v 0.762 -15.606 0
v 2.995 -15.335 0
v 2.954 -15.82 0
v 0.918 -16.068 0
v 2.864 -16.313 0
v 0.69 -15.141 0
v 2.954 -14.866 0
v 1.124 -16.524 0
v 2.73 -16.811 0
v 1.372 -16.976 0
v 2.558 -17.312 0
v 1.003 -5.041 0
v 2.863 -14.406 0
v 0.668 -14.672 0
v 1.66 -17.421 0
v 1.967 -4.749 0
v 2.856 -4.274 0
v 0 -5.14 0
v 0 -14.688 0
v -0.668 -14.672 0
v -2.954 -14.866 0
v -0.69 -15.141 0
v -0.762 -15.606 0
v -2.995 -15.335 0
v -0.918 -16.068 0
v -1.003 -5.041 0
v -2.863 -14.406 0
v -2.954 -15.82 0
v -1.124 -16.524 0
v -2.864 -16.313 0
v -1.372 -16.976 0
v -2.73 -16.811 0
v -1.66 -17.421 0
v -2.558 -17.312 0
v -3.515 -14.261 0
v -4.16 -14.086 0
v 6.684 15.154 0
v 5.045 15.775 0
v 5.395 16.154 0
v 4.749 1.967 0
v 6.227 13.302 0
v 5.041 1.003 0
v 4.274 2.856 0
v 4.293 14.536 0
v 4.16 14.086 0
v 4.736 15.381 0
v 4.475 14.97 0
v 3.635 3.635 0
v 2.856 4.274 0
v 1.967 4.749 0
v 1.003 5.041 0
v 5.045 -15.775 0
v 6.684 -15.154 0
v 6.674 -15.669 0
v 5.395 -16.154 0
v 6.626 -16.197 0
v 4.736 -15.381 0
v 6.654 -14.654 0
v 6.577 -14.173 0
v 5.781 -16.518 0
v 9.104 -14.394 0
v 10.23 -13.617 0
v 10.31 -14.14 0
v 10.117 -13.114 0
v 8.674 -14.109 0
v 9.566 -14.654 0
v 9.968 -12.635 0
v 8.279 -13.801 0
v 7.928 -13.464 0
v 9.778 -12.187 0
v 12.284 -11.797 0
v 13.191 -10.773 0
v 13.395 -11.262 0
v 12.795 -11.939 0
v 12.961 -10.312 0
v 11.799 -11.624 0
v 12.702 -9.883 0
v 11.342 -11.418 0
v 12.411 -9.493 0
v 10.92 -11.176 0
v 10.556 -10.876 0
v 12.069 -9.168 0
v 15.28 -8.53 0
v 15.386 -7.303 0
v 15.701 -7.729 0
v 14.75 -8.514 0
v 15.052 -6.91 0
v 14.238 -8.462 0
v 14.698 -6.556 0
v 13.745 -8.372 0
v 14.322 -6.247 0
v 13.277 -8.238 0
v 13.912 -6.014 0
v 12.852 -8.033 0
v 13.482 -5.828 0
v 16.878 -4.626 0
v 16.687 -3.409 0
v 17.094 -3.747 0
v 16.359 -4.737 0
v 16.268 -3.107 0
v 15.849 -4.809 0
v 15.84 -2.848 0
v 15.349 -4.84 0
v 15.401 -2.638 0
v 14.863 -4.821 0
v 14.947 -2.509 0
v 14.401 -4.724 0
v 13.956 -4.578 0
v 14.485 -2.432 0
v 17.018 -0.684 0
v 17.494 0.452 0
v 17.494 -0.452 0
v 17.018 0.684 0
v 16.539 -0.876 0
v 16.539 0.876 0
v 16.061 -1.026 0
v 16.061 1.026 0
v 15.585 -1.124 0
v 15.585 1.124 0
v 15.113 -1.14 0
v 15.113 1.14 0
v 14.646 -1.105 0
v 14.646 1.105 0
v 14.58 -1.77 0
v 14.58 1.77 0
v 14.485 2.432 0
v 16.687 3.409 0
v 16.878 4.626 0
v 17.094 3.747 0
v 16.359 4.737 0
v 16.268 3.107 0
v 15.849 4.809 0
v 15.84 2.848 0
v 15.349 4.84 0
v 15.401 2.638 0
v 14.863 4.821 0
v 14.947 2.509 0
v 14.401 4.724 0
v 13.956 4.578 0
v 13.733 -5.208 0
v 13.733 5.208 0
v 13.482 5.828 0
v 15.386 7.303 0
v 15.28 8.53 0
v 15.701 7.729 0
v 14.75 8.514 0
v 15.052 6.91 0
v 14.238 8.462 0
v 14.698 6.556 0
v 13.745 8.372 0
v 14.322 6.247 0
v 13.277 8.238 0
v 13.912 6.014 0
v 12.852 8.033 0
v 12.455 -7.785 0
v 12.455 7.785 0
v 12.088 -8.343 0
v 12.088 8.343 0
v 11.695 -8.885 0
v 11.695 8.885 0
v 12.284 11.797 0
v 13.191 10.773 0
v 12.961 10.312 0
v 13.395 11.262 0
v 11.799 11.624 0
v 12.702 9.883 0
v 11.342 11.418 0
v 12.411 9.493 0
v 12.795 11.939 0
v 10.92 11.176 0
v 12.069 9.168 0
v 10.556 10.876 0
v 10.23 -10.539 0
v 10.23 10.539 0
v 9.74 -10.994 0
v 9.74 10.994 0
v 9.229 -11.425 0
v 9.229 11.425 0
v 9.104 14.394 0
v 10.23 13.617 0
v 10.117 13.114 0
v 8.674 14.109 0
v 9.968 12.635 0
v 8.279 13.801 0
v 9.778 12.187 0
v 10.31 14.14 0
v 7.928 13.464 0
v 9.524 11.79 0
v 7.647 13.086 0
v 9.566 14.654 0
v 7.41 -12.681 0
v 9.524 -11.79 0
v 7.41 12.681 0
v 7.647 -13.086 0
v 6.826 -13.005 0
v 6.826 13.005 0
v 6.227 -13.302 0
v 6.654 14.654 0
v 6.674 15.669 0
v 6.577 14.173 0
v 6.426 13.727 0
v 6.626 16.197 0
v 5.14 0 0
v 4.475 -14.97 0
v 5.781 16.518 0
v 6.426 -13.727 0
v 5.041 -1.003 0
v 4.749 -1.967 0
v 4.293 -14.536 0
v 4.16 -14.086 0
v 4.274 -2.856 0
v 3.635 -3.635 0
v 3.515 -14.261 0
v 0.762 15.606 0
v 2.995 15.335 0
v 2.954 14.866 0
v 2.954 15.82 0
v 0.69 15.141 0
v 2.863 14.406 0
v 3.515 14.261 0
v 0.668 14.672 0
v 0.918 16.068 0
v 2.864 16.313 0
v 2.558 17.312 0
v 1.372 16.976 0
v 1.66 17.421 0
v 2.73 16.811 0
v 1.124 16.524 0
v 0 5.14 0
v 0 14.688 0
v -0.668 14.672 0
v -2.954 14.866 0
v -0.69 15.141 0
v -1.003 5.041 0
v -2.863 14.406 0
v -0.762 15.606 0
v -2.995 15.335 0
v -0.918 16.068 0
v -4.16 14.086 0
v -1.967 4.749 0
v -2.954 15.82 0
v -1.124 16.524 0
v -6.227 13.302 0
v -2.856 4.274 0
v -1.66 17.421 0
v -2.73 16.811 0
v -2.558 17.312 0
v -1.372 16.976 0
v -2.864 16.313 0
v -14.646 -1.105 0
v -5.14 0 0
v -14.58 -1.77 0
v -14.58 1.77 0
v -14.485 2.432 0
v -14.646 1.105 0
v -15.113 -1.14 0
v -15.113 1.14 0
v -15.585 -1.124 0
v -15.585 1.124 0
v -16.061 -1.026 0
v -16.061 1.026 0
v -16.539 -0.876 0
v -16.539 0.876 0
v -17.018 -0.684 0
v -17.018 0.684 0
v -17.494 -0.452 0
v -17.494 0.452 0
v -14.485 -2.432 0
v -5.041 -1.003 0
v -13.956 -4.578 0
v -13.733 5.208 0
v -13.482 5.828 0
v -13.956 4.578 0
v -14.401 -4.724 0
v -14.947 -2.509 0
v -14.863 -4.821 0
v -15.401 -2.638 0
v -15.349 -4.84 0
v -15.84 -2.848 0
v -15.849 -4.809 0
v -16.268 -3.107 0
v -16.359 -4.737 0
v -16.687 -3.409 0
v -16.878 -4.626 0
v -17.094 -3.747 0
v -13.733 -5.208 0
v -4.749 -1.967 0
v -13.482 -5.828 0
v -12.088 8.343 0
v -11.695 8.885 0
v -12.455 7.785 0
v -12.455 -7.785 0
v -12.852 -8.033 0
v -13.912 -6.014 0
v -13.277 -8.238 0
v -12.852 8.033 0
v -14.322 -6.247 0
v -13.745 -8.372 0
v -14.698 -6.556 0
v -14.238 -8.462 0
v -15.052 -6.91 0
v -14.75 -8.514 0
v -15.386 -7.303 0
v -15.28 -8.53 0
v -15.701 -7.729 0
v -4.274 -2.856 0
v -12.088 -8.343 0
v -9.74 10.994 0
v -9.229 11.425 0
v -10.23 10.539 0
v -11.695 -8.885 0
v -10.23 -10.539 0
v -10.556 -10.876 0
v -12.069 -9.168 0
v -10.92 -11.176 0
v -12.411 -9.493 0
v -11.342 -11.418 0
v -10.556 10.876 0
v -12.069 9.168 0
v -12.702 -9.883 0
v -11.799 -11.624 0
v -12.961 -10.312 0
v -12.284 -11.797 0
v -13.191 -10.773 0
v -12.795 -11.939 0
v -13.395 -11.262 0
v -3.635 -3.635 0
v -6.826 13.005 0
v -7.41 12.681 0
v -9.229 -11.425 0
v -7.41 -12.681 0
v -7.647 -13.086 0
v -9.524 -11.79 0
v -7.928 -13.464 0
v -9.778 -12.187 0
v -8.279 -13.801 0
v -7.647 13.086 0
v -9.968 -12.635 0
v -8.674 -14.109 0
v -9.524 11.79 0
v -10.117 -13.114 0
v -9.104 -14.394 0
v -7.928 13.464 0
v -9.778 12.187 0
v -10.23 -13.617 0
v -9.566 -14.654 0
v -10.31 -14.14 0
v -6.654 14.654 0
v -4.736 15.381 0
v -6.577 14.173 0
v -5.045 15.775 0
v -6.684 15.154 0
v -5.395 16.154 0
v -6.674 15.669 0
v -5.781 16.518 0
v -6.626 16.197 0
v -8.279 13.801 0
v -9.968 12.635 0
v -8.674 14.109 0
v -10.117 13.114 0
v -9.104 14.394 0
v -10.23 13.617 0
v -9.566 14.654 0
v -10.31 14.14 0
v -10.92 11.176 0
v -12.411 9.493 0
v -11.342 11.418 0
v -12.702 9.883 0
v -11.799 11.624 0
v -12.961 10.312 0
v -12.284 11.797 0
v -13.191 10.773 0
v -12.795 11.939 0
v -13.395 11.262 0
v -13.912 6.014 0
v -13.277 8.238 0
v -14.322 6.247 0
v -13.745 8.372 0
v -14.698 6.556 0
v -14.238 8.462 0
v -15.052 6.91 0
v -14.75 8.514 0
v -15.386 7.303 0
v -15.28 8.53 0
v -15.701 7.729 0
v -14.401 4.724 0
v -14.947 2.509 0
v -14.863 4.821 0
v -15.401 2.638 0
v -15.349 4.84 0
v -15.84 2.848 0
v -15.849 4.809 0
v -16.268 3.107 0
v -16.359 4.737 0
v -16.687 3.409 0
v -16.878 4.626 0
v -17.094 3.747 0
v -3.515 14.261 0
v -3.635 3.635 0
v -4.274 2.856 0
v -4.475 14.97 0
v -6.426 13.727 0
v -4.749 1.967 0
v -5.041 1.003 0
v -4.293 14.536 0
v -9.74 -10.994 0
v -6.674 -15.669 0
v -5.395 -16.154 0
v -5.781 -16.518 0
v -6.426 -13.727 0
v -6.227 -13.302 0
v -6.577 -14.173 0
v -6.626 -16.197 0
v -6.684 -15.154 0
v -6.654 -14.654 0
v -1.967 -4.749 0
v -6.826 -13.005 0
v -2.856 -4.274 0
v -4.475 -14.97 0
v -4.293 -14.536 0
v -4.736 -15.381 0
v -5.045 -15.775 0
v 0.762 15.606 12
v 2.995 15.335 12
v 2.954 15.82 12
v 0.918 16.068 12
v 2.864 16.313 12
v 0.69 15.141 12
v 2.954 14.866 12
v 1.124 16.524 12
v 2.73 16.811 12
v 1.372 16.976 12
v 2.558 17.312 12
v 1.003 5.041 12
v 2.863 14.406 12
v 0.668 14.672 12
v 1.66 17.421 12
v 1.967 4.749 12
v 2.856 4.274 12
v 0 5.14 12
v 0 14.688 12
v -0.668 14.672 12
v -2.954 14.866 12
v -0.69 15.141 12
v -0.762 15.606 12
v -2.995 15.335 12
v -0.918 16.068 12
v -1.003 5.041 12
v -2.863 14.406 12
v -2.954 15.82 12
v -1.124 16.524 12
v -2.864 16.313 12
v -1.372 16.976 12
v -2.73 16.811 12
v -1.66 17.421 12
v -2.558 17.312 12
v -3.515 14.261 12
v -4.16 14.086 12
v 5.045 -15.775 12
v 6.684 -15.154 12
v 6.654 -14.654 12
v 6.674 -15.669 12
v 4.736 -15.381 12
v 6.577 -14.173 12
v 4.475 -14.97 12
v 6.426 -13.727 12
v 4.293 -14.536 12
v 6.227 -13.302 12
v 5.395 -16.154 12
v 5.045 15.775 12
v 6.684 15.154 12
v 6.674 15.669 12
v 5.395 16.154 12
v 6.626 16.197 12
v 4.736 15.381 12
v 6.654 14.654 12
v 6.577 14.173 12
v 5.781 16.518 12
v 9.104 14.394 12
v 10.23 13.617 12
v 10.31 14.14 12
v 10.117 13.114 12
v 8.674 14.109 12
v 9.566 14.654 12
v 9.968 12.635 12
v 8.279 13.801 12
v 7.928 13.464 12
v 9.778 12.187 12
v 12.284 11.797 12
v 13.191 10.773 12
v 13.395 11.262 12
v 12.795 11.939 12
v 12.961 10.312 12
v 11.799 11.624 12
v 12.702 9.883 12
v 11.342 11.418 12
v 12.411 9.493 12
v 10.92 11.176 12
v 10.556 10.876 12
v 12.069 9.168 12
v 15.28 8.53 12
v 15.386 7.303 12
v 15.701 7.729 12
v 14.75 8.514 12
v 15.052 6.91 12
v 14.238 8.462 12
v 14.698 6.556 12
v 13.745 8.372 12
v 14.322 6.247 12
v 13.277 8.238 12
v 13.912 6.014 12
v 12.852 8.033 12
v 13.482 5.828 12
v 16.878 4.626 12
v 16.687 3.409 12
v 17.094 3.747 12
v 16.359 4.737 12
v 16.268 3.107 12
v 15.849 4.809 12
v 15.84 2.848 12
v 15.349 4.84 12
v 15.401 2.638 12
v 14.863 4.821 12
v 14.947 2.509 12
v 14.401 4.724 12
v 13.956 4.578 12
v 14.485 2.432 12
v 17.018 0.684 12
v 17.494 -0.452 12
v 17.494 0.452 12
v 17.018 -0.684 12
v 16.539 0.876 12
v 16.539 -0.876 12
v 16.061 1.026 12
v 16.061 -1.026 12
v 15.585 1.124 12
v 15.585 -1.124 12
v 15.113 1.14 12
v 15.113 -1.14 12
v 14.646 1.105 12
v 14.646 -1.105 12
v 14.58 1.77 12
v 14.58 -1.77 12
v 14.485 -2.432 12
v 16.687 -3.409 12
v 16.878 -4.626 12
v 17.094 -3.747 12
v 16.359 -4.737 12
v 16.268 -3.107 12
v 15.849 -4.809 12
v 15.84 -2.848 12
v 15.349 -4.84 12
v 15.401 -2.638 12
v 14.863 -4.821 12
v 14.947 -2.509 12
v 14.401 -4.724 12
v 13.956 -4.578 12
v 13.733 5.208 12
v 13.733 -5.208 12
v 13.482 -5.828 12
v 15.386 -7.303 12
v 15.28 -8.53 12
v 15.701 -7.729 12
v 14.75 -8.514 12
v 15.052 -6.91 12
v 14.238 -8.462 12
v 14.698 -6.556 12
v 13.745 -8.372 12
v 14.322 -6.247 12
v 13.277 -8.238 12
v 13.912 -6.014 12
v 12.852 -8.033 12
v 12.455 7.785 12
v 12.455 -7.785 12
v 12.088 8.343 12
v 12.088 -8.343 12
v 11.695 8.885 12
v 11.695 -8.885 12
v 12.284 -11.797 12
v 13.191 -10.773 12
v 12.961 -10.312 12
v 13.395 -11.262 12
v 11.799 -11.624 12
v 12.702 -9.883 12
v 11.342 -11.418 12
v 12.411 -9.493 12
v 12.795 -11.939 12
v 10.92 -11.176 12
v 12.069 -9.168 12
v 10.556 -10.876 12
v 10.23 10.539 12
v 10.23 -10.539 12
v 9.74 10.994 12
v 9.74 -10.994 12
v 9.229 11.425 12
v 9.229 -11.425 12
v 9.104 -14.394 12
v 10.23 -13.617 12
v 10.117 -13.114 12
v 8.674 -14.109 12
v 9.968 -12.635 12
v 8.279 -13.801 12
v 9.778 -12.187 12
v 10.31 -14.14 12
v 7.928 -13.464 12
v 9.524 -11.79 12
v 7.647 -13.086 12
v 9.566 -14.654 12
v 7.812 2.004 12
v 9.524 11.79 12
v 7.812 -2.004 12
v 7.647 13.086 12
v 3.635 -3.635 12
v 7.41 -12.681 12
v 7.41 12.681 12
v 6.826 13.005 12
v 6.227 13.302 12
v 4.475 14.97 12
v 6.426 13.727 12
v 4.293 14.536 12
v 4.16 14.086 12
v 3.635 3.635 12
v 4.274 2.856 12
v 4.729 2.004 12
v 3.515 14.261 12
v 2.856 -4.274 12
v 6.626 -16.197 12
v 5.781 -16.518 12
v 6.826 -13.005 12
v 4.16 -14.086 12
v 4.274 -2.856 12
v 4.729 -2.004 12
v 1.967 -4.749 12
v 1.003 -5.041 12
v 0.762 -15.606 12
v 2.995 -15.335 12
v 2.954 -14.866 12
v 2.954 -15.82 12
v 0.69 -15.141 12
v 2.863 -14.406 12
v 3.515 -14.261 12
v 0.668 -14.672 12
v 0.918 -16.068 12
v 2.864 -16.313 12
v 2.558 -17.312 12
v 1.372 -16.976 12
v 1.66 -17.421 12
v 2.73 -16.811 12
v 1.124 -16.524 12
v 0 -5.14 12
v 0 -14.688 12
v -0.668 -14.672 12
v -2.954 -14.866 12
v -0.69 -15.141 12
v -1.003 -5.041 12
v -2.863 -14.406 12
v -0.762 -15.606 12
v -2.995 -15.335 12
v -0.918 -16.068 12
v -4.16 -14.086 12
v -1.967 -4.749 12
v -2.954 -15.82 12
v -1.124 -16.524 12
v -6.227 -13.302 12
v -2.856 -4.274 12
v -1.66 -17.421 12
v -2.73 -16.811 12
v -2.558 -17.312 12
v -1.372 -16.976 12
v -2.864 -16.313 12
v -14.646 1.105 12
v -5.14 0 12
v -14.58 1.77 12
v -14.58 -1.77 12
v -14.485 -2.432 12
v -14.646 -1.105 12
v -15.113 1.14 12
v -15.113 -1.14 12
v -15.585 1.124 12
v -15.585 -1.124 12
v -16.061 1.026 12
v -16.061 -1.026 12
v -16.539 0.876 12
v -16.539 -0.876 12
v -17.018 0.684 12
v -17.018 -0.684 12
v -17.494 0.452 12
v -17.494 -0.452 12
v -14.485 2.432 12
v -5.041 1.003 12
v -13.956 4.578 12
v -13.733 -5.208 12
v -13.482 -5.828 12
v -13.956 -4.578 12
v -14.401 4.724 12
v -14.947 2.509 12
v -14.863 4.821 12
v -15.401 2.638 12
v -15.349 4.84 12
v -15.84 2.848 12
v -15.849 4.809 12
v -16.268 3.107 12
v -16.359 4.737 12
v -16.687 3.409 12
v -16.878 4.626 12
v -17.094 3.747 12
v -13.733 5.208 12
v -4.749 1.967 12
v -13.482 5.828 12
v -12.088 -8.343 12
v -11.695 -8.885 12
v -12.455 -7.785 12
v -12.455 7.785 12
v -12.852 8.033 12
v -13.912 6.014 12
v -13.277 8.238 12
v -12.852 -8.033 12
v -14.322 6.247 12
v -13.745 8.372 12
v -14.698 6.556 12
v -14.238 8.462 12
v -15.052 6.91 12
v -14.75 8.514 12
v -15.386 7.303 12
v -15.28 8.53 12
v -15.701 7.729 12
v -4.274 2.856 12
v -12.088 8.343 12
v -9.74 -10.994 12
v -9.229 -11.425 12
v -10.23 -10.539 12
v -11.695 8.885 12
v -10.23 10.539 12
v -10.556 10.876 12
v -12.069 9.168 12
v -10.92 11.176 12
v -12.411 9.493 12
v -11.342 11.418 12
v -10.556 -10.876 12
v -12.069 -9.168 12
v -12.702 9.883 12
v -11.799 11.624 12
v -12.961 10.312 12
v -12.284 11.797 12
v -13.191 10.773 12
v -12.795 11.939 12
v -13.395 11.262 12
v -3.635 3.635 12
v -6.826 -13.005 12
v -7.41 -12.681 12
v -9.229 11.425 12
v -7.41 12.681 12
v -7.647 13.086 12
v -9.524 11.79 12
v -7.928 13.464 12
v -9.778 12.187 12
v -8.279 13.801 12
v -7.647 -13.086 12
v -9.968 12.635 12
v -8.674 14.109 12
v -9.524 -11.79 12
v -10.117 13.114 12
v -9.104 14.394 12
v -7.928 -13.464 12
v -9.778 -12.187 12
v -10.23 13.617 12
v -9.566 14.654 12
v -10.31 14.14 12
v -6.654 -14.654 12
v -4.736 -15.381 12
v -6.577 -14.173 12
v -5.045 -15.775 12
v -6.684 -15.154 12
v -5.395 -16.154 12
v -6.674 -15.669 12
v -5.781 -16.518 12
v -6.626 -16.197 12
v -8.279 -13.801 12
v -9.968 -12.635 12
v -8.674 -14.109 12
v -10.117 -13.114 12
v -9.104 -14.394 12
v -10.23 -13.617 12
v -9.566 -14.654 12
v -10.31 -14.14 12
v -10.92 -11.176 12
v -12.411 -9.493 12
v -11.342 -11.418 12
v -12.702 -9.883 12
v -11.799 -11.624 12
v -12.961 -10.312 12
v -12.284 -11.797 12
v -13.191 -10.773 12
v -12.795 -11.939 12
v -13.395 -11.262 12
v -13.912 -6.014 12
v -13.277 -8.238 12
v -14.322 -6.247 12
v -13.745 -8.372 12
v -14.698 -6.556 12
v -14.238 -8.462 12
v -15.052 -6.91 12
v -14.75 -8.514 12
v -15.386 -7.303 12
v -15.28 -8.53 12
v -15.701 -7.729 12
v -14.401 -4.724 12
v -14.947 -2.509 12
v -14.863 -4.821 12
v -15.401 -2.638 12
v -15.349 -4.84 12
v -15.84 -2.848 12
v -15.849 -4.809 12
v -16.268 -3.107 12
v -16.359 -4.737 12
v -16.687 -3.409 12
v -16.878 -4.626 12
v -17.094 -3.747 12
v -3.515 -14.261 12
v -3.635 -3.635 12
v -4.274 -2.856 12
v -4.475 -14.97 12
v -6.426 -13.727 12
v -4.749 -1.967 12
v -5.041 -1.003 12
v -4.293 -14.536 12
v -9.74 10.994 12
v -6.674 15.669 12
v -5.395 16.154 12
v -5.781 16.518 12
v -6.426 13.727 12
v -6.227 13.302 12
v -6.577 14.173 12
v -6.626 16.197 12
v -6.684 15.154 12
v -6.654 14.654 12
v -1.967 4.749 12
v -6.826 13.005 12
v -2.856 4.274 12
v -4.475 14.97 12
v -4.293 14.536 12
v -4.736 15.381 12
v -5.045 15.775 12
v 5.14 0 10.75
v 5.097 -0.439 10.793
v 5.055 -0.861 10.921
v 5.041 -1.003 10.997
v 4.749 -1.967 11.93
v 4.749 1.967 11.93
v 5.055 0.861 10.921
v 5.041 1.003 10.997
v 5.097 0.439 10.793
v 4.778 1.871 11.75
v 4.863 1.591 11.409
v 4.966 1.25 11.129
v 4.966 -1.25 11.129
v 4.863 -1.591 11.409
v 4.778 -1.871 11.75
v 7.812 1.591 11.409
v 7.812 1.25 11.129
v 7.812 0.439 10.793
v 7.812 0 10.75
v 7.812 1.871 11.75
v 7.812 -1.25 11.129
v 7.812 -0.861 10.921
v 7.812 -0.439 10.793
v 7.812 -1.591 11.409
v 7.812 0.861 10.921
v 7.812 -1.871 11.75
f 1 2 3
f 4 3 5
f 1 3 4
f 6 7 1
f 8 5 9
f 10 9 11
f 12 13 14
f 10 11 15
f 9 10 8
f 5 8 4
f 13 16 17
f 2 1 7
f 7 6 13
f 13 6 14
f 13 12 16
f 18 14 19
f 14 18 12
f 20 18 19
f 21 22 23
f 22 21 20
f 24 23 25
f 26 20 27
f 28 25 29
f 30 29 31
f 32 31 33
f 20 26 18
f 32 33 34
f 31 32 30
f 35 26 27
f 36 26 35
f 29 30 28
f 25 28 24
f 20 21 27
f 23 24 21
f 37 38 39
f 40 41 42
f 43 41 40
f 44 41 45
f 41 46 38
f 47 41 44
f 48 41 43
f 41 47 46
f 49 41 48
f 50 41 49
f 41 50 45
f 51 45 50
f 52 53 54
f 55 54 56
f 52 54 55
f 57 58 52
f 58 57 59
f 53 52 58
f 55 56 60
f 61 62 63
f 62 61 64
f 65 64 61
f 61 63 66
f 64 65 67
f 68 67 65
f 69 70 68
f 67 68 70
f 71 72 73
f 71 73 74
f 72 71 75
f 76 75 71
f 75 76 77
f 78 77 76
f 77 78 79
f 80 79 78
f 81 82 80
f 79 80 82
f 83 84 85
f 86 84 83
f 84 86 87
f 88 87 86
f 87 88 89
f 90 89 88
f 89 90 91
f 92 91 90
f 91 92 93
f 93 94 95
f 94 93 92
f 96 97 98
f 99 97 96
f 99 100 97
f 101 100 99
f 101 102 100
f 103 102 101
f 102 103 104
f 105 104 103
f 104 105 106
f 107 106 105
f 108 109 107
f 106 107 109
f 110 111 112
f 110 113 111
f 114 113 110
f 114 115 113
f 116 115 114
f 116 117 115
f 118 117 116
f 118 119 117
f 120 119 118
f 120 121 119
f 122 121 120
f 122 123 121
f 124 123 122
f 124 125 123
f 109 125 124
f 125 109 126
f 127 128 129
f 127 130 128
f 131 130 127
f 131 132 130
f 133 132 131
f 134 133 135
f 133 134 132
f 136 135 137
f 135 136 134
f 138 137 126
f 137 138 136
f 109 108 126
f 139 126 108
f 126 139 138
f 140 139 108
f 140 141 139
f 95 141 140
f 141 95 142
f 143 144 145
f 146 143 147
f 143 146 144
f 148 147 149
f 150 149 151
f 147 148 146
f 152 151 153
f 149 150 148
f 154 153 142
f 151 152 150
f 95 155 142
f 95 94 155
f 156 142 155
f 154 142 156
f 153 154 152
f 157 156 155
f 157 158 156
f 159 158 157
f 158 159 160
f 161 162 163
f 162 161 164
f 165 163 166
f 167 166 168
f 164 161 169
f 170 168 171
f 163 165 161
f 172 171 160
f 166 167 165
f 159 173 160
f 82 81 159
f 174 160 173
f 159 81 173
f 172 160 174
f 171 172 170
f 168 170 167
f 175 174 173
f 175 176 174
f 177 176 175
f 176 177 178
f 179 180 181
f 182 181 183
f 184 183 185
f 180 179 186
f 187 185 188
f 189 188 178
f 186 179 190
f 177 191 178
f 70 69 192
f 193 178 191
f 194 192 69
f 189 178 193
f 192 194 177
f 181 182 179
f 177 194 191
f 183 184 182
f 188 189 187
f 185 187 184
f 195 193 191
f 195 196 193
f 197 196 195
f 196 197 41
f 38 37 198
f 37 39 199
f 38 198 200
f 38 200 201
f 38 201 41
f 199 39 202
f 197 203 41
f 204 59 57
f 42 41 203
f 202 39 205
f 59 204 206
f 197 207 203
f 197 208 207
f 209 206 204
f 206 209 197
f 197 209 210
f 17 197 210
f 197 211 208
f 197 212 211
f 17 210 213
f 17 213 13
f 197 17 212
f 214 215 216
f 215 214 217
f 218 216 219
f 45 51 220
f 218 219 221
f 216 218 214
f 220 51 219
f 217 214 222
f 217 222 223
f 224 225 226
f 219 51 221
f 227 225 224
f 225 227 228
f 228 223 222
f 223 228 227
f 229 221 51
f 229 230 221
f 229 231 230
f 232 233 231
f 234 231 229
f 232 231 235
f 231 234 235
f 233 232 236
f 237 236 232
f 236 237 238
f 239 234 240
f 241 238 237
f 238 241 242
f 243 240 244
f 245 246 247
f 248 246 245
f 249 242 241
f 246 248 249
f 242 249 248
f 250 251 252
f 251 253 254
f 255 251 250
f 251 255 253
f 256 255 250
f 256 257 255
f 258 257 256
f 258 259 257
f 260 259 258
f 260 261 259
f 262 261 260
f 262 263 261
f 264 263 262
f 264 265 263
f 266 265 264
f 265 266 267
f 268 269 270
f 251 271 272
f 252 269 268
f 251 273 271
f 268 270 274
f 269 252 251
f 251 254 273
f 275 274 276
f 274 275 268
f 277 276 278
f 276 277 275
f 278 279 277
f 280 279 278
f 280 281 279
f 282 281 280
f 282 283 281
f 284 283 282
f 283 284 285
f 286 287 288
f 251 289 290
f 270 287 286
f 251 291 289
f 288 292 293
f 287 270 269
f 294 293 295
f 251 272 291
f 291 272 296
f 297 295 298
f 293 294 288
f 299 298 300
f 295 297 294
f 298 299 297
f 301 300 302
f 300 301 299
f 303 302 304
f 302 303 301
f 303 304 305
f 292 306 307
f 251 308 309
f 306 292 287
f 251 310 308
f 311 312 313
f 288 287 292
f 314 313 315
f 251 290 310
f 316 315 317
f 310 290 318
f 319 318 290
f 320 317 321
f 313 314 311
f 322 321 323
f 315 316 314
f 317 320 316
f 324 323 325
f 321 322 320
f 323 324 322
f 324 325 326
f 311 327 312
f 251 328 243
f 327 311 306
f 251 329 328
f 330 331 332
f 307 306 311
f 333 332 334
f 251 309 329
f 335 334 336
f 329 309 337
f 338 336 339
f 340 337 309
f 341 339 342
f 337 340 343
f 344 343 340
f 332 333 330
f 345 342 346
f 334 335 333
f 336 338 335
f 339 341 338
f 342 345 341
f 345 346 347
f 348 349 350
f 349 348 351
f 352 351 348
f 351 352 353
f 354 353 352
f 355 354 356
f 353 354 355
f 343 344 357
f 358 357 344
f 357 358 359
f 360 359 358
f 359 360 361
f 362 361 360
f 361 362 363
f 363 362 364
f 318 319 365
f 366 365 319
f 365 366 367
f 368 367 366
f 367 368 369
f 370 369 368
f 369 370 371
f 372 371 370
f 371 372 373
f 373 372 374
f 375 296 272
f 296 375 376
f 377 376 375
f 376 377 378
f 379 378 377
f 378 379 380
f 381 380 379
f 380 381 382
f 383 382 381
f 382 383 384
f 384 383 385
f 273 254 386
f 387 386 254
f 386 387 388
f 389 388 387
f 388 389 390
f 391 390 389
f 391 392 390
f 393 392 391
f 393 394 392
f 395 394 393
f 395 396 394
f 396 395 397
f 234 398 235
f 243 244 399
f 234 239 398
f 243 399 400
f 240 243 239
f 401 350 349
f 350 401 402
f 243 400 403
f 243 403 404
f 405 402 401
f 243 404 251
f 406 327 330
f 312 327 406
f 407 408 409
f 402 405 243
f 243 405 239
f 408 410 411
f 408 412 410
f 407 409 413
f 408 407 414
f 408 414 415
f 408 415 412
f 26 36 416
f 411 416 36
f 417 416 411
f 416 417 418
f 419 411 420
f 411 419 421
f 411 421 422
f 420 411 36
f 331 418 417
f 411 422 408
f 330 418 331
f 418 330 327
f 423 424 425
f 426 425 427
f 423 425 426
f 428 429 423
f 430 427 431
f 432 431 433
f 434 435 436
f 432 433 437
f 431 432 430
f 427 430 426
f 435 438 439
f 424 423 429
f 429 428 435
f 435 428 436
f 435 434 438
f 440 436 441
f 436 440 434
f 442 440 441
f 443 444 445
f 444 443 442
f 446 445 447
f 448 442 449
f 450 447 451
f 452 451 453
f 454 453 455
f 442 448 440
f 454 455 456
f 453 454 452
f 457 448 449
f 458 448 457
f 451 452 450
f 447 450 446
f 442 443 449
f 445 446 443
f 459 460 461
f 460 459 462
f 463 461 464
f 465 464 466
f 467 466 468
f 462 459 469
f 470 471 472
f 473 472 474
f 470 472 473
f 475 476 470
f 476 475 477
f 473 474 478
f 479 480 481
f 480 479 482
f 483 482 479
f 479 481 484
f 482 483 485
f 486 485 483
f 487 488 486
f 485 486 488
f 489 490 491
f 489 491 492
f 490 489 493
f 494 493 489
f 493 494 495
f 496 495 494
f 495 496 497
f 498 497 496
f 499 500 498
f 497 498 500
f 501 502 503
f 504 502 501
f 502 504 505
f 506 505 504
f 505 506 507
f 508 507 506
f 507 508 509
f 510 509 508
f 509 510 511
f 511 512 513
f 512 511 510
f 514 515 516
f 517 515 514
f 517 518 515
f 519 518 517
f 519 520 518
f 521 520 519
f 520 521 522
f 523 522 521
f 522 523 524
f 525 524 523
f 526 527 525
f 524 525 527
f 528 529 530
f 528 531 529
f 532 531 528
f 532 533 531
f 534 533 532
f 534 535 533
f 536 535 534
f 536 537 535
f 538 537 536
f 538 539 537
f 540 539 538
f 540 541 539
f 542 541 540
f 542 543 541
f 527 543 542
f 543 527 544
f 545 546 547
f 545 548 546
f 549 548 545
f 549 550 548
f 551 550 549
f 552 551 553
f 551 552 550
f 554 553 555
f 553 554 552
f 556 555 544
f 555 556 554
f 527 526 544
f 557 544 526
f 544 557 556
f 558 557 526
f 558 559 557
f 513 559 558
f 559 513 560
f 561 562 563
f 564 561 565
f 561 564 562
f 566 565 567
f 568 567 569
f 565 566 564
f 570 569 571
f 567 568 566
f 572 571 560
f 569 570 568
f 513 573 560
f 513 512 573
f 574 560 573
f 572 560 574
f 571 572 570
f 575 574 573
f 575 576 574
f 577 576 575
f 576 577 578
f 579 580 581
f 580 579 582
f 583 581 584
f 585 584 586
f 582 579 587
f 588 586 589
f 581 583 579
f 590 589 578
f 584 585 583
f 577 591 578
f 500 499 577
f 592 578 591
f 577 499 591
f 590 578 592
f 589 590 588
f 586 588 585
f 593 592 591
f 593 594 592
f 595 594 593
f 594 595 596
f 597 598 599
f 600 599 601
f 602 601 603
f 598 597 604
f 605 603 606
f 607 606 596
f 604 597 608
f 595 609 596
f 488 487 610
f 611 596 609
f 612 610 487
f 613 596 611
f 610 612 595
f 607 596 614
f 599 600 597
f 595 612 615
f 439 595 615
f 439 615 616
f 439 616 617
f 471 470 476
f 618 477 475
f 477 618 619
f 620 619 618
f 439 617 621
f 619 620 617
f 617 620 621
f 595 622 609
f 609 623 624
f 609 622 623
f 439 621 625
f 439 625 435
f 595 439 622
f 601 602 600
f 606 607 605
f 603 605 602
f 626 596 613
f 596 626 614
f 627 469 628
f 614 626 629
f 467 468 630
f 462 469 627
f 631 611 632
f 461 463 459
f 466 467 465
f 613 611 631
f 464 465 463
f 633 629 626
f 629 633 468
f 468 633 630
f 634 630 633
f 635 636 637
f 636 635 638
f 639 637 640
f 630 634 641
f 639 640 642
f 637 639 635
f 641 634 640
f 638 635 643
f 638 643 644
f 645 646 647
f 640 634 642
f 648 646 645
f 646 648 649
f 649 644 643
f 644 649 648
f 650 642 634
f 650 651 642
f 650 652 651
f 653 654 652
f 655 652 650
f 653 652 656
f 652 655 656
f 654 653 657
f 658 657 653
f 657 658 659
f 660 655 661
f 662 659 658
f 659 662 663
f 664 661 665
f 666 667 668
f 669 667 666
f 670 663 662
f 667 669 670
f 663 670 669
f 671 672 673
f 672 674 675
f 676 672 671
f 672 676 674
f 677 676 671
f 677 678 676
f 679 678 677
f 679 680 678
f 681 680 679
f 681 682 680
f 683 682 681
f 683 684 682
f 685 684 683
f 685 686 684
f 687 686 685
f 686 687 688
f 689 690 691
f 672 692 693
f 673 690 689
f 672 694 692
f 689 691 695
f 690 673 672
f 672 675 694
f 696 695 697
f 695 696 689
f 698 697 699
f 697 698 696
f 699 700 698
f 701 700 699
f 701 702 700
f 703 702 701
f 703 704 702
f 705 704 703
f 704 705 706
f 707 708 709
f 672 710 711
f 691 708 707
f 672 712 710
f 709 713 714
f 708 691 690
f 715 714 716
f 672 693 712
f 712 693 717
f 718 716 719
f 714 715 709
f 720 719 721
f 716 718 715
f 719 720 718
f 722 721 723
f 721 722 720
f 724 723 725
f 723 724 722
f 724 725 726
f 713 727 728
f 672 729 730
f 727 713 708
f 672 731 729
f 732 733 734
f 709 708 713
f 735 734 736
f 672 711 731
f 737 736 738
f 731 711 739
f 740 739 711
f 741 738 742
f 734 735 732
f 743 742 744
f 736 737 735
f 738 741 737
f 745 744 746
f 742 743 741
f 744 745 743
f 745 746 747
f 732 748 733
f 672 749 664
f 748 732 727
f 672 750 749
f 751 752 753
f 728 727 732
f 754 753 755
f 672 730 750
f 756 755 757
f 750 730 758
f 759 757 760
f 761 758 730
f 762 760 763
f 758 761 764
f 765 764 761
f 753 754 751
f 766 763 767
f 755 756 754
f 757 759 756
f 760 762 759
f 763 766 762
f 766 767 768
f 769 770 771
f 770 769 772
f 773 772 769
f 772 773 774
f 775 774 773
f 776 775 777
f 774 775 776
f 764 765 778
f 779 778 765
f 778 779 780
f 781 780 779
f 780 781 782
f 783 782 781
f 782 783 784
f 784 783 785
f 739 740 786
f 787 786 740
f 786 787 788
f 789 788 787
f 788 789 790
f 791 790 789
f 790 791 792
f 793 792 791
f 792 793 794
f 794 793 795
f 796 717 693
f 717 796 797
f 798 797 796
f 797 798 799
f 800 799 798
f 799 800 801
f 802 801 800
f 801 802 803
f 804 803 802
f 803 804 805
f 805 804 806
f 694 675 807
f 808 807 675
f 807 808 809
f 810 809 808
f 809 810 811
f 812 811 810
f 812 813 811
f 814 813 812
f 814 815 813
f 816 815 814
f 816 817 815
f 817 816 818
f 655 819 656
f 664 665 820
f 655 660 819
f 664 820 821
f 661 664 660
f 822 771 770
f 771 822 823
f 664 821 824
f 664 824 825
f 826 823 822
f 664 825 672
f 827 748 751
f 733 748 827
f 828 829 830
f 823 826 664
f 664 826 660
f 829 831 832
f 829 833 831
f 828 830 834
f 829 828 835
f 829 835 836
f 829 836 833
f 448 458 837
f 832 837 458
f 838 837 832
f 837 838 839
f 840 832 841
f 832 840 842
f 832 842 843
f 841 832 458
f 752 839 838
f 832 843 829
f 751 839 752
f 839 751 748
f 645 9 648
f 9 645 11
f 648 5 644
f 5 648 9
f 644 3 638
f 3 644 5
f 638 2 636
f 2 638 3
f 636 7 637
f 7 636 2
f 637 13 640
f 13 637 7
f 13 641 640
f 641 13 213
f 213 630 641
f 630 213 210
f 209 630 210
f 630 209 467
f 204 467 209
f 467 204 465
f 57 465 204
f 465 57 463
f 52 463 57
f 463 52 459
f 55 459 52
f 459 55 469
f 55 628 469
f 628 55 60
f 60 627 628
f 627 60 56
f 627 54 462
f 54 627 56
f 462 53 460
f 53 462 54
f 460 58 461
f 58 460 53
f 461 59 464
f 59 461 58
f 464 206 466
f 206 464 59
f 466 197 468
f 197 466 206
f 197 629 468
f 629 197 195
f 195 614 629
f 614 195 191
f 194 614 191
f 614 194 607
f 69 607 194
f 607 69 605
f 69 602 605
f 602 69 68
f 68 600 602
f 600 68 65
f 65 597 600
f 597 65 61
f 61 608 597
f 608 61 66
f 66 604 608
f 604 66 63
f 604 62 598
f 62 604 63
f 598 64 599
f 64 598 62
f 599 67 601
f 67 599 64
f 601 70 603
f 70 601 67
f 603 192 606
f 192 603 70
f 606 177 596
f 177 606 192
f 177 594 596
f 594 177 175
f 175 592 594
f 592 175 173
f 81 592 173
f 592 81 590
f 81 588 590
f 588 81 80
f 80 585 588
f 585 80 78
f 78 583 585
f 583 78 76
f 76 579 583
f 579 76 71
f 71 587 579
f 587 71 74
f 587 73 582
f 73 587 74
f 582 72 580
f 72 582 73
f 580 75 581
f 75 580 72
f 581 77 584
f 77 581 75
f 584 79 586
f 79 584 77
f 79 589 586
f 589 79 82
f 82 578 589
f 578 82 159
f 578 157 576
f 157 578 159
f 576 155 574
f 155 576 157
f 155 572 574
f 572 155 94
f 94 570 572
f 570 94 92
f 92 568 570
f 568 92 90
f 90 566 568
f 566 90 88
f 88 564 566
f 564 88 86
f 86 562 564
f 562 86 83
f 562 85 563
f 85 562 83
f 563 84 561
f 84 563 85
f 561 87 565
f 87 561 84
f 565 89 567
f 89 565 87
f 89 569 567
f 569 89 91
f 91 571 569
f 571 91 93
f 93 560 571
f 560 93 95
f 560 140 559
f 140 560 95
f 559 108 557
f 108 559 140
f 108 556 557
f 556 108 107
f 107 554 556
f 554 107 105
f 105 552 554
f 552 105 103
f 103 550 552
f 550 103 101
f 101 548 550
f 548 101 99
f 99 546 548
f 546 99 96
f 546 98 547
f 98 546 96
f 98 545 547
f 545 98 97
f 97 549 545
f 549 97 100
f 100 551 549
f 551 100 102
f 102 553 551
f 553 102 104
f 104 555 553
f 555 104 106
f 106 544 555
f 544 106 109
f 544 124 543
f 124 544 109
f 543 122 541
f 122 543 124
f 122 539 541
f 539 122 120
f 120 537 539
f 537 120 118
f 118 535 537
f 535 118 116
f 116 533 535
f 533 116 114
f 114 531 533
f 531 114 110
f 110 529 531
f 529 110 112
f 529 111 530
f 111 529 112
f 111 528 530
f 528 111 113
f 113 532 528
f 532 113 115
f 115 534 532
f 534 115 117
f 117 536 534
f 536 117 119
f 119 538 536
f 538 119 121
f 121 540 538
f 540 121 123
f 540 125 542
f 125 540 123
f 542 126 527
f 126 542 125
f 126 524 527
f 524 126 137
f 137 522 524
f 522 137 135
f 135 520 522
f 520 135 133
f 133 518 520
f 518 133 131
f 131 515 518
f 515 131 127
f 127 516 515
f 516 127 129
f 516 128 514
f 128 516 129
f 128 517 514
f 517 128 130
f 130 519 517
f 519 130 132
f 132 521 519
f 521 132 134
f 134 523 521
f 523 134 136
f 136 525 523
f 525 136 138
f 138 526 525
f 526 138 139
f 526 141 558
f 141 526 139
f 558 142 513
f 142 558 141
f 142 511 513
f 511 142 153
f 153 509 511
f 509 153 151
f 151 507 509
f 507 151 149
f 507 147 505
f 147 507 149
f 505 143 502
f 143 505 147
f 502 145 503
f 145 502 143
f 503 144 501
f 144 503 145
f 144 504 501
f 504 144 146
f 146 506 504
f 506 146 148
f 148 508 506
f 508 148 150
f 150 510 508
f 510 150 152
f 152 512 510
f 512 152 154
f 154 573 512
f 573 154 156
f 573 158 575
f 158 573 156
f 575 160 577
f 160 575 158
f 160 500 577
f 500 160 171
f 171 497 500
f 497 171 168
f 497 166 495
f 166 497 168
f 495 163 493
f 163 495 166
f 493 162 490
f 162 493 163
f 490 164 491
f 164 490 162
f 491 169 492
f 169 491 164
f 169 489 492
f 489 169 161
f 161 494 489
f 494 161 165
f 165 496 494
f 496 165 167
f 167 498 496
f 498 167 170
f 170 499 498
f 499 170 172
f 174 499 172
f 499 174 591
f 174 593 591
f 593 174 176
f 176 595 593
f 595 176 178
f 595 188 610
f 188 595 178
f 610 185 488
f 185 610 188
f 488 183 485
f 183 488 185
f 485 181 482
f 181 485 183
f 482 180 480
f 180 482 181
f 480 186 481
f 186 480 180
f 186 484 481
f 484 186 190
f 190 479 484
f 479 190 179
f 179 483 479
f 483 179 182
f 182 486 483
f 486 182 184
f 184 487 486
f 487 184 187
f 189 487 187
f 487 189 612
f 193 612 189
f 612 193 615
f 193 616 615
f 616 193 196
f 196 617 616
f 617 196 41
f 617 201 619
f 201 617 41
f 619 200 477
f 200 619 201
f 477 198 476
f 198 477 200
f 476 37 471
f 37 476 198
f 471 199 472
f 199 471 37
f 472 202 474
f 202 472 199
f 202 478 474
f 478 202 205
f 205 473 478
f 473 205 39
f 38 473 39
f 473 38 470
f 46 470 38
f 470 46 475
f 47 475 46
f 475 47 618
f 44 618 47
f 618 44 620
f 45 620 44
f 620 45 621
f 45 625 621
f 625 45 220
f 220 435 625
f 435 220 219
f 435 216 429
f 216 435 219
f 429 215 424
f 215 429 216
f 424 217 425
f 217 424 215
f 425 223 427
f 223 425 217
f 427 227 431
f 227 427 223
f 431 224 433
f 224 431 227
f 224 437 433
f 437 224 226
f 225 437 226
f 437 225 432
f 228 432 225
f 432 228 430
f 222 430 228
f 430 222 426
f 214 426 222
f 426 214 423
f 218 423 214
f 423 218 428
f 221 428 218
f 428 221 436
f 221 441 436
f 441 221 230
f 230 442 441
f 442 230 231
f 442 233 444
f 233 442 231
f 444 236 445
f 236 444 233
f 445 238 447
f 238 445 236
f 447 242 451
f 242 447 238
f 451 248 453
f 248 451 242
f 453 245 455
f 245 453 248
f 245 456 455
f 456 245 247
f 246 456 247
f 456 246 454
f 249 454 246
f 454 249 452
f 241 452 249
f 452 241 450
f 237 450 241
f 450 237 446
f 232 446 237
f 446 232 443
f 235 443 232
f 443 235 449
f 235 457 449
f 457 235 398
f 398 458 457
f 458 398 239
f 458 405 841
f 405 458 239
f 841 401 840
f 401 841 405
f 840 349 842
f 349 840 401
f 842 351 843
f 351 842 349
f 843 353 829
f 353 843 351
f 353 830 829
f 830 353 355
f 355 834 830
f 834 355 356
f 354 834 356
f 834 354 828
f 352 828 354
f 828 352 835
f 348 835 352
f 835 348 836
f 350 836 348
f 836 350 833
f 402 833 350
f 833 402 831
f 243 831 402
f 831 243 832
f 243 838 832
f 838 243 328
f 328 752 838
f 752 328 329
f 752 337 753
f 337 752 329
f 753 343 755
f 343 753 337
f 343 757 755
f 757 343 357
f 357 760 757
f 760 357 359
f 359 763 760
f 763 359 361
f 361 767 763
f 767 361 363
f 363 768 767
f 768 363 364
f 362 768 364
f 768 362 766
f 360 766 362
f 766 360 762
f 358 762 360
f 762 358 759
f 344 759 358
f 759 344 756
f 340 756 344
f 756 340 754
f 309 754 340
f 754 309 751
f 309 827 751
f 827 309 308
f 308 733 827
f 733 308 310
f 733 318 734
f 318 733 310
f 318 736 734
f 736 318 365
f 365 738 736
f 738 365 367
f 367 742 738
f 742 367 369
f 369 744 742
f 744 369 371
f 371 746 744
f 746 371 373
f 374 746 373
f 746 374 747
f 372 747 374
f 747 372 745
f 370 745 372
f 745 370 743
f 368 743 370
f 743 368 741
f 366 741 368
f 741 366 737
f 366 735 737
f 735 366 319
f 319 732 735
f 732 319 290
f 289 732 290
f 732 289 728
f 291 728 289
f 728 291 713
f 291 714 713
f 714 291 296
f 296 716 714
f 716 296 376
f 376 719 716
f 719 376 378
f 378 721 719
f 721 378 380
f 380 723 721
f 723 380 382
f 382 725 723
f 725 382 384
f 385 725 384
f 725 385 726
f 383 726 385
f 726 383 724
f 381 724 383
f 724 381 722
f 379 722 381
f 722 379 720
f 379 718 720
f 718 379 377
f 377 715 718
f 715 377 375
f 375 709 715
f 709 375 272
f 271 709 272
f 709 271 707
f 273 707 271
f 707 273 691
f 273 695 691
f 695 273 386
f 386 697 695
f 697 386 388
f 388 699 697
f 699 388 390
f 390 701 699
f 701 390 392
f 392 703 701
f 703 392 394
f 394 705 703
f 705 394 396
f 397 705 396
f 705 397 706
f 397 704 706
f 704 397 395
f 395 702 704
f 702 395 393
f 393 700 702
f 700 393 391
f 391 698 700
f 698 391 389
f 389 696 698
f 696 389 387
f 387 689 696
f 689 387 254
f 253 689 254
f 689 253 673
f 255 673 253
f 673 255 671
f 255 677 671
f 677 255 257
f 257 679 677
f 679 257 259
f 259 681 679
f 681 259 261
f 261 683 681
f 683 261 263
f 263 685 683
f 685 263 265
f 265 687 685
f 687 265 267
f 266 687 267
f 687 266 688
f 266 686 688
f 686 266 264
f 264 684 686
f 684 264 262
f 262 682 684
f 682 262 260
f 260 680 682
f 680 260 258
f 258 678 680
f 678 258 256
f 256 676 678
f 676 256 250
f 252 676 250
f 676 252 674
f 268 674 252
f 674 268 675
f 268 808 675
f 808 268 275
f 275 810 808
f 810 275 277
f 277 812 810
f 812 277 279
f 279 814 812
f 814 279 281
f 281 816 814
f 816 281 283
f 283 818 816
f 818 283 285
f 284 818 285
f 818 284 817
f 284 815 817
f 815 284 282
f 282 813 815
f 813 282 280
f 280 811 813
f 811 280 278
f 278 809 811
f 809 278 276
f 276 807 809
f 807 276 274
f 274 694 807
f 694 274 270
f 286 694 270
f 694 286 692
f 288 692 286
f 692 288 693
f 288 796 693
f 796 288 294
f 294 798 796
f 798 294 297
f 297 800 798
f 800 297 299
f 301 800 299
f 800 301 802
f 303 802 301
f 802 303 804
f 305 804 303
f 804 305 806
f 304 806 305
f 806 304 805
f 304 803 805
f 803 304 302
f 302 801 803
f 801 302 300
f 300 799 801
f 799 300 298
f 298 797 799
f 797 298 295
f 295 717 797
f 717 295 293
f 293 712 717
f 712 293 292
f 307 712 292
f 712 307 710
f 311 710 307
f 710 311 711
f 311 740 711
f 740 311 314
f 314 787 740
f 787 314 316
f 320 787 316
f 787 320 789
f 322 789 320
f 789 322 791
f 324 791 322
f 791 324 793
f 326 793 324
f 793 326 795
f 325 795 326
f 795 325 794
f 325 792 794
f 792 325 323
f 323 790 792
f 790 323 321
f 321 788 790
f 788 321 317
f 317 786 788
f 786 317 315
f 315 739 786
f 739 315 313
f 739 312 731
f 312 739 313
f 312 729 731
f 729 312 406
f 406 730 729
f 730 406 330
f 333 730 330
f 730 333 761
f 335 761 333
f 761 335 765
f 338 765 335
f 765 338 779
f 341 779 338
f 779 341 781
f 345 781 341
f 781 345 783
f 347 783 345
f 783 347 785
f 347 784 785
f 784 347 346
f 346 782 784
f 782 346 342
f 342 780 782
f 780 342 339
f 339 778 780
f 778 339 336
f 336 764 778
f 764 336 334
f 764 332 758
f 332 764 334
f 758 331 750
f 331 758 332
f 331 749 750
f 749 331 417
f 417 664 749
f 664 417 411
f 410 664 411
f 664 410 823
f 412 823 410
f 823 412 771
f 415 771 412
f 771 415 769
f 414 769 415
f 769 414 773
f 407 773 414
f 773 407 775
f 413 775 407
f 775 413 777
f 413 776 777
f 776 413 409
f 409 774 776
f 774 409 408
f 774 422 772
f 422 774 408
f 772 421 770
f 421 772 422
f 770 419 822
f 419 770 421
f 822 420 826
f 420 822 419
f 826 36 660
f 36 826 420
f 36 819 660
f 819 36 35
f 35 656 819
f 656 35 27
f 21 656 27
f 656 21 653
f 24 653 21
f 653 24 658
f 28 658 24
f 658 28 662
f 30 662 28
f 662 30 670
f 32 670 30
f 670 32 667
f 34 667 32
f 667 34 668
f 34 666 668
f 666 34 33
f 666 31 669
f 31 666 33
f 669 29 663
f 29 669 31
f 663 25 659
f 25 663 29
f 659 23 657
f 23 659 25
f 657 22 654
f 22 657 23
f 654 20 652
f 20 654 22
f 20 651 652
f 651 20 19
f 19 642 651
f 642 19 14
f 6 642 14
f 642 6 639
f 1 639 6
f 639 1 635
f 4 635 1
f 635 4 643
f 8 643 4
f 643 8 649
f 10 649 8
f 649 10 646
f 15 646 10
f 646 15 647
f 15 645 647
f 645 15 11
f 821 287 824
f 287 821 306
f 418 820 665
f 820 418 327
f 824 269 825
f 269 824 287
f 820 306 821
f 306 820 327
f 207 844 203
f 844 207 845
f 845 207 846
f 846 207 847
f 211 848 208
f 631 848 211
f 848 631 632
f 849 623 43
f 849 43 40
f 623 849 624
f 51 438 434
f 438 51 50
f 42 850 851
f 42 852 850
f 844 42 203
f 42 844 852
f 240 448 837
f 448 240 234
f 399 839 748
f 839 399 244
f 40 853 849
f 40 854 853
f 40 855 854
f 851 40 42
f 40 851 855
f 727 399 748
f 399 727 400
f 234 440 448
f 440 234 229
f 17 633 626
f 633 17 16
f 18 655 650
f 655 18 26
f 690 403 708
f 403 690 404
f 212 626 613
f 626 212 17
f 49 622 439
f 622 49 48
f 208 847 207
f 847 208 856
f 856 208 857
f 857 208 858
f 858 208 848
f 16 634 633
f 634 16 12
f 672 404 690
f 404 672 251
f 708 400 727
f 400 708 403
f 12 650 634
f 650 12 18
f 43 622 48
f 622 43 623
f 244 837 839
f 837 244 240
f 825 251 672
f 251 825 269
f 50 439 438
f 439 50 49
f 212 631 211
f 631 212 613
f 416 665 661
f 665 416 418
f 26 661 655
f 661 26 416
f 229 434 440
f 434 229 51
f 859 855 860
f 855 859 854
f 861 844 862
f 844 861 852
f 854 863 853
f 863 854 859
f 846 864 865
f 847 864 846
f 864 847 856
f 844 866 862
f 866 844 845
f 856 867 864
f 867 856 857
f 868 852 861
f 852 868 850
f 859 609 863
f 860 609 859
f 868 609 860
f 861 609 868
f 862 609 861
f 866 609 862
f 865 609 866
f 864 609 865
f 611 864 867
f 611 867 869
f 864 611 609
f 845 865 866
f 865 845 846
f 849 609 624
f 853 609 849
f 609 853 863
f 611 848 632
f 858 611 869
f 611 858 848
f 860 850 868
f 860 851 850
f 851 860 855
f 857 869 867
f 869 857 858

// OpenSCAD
$fn = 32;

// ----------------------------------------------------------------------
// Spur gear: m=1.25 z=26, 35 mm tip diameter x 12 mm
// ----------------------------------------------------------------------

// --- parameters (mm) ---
gear_module = 1.25;       // module
tooth_count = 26;         // number of teeth
gear_w = 12;              // face width
pa = 20;                  // pressure angle, deg
bore = 10.28;             // shaft bore
set_d = 4.5;              // set screw tap hole
set_z = 13;               // set screw height

/* --- involute profile --- */
pitch_r = gear_module * tooth_count / 2;
base_r = pitch_r * cos(pa);
tip_r = pitch_r + gear_module;
root_r = pitch_r - 1.25 * gear_module;
flank_steps = 6;

function inv_deg(a) = (tan(a) - a * PI / 180) * 180 / PI;
function flank_r(i) = root_r + (tip_r - root_r) * i / flank_steps;
function half_angle(r) = 90 / tooth_count + inv_deg(pa) - inv_deg(acos(min(1, base_r / r)));
function tooth_pt(k, i, side) =
    let (r = flank_r(i), a = k * 360 / tooth_count + side * half_angle(r))
    [r * cos(a), r * sin(a)];

module tooth_profile() {
  polygon(points = [
    for (k = [0 : tooth_count - 1])
      each [
        for (i = [0 : flank_steps]) tooth_pt(k, i, -1),
        for (i = [flank_steps : -1 : 0]) tooth_pt(k, i, 1),
        let (ta = (k + 0.5) * 360 / tooth_count)
          [root_r * cos(ta), root_r * sin(ta)]
      ]
  ]);
}

module gear_disc() {
  linear_extrude(height = gear_w) tooth_profile();
}

difference() {
  gear_disc();
  translate([0, 0, -1]) cylinder(h = gear_w + 3, d = bore);
  /* set screw, drilled radially */
  translate([-1, 0, set_z]) rotate([0, 90, 0]) cylinder(h = (root_r * 0.6), d = set_d);
}
